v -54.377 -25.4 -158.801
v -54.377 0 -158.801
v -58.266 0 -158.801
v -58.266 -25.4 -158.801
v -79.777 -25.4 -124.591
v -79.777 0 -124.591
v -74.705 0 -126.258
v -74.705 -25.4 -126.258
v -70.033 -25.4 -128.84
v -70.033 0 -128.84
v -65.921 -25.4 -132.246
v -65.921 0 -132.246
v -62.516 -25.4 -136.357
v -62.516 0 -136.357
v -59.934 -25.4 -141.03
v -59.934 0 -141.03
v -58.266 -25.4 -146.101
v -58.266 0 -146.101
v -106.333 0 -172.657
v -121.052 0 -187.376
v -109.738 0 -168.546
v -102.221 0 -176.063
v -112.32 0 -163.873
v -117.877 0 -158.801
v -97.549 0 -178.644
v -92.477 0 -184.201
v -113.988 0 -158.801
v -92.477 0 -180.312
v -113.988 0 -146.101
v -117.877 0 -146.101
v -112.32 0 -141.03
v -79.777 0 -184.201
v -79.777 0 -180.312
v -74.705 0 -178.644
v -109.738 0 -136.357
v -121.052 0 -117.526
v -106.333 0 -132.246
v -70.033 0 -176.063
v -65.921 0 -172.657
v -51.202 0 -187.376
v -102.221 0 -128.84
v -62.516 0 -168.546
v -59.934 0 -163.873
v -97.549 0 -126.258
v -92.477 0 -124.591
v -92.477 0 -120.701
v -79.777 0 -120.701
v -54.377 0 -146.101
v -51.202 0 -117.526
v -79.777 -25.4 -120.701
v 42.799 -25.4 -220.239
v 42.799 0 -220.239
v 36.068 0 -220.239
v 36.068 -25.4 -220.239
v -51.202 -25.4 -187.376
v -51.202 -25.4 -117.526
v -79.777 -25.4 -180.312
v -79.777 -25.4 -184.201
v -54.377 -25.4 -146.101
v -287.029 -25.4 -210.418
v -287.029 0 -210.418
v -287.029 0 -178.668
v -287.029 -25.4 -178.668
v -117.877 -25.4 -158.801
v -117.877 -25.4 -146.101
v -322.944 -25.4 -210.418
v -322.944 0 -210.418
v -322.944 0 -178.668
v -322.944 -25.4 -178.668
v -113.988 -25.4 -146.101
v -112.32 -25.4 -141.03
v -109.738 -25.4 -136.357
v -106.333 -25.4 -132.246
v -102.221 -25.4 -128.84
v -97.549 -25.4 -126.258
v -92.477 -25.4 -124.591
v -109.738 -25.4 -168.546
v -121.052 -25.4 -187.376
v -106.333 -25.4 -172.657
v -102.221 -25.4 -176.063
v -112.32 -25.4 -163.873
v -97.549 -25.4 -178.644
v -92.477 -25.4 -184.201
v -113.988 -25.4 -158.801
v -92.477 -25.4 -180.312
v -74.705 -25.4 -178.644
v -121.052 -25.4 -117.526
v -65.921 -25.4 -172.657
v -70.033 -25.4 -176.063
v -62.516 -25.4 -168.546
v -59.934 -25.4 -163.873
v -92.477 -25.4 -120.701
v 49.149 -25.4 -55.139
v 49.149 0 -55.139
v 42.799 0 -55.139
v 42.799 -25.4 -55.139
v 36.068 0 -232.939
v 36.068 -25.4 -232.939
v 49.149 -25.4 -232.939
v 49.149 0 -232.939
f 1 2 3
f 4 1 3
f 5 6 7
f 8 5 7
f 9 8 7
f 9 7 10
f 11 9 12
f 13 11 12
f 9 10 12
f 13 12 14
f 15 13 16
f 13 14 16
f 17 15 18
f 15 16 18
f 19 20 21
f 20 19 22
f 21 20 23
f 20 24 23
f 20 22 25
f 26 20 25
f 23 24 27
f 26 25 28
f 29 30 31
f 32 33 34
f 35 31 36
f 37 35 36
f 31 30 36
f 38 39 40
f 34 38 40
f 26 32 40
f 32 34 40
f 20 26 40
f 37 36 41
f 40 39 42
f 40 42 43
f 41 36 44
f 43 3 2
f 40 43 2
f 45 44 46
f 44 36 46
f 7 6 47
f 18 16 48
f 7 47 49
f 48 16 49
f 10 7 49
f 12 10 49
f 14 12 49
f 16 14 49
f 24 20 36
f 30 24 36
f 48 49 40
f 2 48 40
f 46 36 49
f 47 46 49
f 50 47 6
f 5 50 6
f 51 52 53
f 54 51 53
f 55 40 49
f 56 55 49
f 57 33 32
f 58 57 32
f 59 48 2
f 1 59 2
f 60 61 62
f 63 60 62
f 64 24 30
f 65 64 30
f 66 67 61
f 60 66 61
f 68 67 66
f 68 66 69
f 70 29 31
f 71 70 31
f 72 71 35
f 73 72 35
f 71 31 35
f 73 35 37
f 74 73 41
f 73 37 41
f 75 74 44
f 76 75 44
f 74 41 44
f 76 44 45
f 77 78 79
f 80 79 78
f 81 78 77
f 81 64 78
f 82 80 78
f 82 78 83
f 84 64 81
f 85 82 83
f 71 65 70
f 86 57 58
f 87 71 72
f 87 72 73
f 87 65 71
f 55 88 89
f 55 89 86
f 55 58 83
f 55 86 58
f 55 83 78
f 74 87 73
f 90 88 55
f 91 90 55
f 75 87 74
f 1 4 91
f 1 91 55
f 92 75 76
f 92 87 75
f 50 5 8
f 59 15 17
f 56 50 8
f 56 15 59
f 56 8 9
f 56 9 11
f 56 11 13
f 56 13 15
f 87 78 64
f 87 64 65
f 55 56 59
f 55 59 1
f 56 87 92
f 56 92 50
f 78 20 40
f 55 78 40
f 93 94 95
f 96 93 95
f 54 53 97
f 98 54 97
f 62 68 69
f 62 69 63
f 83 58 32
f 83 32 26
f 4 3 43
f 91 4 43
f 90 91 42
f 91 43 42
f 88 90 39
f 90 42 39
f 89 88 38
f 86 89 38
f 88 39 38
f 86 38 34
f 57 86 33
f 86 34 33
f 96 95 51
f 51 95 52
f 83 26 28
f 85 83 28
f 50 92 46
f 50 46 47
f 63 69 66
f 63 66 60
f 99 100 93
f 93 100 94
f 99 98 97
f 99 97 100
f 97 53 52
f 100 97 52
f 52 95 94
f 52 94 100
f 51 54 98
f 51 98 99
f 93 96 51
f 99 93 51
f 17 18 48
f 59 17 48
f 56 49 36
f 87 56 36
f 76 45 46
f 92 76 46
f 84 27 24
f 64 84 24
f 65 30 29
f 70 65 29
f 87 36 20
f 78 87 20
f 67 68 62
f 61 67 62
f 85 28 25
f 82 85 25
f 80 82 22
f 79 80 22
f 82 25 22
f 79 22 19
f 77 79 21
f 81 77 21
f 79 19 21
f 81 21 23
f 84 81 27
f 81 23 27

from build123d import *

# Parameters (mm, degrees)
F0_W     = 35.9156
F0_H     = 31.75
F1_DEPTH = 25.4


with BuildPart() as f1:
    # F0 (on Front) → F1 (new body)
    with BuildSketch(Plane.XZ):
        Polygon((-92.476995, -117.526305), (-121.051995, -117.526305), (-121.051995, -146.101305), (-121.051995, -158.801305), (-121.051995, -187.376305), (-92.476995, -187.376305), (-86.126995, -187.376305), (-79.776995, -187.376305), (-51.201995, -187.376305), (-51.201995, -158.801305), (-51.201995, -152.451305), (-51.201995, -146.101305), (-51.201995, -117.526305), (-79.776995, -117.526305), (-86.126995, -117.526305), align=None)
        with BuildLine():
            ThreePointArc((-92.476995, -180.311817), (-106.332572, -172.656882), (-113.987507, -158.801305))
            Line((-113.987507, -158.801305), (-117.519751, -158.801305))
            Line((-117.519751, -158.801305), (-117.876995, -158.801305))
            Line((-117.876995, -158.801305), (-117.876995, -152.451305))
            Line((-117.876995, -152.451305), (-117.876995, -146.101305))
            Line((-117.876995, -146.101305), (-117.519751, -146.101305))
            Line((-117.519751, -146.101305), (-113.987507, -146.101305))
            ThreePointArc((-113.987507, -146.101305), (-106.332572, -132.245729), (-92.476995, -124.590794))
            Line((-92.476995, -124.590794), (-92.476995, -121.058549))
            Line((-92.476995, -121.058549), (-92.476995, -120.701305))
            Line((-92.476995, -120.701305), (-86.126995, -120.701305))
            Line((-86.126995, -120.701305), (-79.776995, -120.701305))
            Line((-79.776995, -120.701305), (-79.776995, -121.058549))
            Line((-79.776995, -121.058549), (-79.776995, -124.590794))
            ThreePointArc((-79.776995, -124.590794), (-65.921419, -132.245729), (-58.266484, -146.101305))
            Line((-58.266484, -146.101305), (-54.734239, -146.101305))
            Line((-54.734239, -146.101305), (-54.376995, -146.101305))
            Line((-54.376995, -146.101305), (-54.376995, -152.451305))
            Line((-54.376995, -152.451305), (-54.376995, -158.801305))
            Line((-54.376995, -158.801305), (-54.734239, -158.801305))
            Line((-54.734239, -158.801305), (-58.266484, -158.801305))
            ThreePointArc((-58.266484, -158.801305), (-65.921419, -172.656882), (-79.776995, -180.311817))
            Line((-79.776995, -180.311817), (-79.776995, -183.844061))
            Line((-79.776995, -183.844061), (-79.776995, -184.201305))
            Line((-79.776995, -184.201305), (-86.126995, -184.201305))
            Line((-86.126995, -184.201305), (-92.476995, -184.201305))
            Line((-92.476995, -184.201305), (-92.476995, -183.844061))
            Line((-92.476995, -183.844061), (-92.476995, -180.311817))
        make_face(mode=Mode.SUBTRACT)
        Polygon((36.067545, -220.23905), (36.067545, -232.93905), (49.148545, -232.93905), (49.148545, -220.23905), (49.148545, -55.13905), (42.798545, -55.13905), (42.798545, -220.23905), align=None)
        with Locations((-304.986647, -194.543284)):
            Rectangle(F0_W, F0_H)
    extrude(amount=F1_DEPTH)


solid = f1.part
